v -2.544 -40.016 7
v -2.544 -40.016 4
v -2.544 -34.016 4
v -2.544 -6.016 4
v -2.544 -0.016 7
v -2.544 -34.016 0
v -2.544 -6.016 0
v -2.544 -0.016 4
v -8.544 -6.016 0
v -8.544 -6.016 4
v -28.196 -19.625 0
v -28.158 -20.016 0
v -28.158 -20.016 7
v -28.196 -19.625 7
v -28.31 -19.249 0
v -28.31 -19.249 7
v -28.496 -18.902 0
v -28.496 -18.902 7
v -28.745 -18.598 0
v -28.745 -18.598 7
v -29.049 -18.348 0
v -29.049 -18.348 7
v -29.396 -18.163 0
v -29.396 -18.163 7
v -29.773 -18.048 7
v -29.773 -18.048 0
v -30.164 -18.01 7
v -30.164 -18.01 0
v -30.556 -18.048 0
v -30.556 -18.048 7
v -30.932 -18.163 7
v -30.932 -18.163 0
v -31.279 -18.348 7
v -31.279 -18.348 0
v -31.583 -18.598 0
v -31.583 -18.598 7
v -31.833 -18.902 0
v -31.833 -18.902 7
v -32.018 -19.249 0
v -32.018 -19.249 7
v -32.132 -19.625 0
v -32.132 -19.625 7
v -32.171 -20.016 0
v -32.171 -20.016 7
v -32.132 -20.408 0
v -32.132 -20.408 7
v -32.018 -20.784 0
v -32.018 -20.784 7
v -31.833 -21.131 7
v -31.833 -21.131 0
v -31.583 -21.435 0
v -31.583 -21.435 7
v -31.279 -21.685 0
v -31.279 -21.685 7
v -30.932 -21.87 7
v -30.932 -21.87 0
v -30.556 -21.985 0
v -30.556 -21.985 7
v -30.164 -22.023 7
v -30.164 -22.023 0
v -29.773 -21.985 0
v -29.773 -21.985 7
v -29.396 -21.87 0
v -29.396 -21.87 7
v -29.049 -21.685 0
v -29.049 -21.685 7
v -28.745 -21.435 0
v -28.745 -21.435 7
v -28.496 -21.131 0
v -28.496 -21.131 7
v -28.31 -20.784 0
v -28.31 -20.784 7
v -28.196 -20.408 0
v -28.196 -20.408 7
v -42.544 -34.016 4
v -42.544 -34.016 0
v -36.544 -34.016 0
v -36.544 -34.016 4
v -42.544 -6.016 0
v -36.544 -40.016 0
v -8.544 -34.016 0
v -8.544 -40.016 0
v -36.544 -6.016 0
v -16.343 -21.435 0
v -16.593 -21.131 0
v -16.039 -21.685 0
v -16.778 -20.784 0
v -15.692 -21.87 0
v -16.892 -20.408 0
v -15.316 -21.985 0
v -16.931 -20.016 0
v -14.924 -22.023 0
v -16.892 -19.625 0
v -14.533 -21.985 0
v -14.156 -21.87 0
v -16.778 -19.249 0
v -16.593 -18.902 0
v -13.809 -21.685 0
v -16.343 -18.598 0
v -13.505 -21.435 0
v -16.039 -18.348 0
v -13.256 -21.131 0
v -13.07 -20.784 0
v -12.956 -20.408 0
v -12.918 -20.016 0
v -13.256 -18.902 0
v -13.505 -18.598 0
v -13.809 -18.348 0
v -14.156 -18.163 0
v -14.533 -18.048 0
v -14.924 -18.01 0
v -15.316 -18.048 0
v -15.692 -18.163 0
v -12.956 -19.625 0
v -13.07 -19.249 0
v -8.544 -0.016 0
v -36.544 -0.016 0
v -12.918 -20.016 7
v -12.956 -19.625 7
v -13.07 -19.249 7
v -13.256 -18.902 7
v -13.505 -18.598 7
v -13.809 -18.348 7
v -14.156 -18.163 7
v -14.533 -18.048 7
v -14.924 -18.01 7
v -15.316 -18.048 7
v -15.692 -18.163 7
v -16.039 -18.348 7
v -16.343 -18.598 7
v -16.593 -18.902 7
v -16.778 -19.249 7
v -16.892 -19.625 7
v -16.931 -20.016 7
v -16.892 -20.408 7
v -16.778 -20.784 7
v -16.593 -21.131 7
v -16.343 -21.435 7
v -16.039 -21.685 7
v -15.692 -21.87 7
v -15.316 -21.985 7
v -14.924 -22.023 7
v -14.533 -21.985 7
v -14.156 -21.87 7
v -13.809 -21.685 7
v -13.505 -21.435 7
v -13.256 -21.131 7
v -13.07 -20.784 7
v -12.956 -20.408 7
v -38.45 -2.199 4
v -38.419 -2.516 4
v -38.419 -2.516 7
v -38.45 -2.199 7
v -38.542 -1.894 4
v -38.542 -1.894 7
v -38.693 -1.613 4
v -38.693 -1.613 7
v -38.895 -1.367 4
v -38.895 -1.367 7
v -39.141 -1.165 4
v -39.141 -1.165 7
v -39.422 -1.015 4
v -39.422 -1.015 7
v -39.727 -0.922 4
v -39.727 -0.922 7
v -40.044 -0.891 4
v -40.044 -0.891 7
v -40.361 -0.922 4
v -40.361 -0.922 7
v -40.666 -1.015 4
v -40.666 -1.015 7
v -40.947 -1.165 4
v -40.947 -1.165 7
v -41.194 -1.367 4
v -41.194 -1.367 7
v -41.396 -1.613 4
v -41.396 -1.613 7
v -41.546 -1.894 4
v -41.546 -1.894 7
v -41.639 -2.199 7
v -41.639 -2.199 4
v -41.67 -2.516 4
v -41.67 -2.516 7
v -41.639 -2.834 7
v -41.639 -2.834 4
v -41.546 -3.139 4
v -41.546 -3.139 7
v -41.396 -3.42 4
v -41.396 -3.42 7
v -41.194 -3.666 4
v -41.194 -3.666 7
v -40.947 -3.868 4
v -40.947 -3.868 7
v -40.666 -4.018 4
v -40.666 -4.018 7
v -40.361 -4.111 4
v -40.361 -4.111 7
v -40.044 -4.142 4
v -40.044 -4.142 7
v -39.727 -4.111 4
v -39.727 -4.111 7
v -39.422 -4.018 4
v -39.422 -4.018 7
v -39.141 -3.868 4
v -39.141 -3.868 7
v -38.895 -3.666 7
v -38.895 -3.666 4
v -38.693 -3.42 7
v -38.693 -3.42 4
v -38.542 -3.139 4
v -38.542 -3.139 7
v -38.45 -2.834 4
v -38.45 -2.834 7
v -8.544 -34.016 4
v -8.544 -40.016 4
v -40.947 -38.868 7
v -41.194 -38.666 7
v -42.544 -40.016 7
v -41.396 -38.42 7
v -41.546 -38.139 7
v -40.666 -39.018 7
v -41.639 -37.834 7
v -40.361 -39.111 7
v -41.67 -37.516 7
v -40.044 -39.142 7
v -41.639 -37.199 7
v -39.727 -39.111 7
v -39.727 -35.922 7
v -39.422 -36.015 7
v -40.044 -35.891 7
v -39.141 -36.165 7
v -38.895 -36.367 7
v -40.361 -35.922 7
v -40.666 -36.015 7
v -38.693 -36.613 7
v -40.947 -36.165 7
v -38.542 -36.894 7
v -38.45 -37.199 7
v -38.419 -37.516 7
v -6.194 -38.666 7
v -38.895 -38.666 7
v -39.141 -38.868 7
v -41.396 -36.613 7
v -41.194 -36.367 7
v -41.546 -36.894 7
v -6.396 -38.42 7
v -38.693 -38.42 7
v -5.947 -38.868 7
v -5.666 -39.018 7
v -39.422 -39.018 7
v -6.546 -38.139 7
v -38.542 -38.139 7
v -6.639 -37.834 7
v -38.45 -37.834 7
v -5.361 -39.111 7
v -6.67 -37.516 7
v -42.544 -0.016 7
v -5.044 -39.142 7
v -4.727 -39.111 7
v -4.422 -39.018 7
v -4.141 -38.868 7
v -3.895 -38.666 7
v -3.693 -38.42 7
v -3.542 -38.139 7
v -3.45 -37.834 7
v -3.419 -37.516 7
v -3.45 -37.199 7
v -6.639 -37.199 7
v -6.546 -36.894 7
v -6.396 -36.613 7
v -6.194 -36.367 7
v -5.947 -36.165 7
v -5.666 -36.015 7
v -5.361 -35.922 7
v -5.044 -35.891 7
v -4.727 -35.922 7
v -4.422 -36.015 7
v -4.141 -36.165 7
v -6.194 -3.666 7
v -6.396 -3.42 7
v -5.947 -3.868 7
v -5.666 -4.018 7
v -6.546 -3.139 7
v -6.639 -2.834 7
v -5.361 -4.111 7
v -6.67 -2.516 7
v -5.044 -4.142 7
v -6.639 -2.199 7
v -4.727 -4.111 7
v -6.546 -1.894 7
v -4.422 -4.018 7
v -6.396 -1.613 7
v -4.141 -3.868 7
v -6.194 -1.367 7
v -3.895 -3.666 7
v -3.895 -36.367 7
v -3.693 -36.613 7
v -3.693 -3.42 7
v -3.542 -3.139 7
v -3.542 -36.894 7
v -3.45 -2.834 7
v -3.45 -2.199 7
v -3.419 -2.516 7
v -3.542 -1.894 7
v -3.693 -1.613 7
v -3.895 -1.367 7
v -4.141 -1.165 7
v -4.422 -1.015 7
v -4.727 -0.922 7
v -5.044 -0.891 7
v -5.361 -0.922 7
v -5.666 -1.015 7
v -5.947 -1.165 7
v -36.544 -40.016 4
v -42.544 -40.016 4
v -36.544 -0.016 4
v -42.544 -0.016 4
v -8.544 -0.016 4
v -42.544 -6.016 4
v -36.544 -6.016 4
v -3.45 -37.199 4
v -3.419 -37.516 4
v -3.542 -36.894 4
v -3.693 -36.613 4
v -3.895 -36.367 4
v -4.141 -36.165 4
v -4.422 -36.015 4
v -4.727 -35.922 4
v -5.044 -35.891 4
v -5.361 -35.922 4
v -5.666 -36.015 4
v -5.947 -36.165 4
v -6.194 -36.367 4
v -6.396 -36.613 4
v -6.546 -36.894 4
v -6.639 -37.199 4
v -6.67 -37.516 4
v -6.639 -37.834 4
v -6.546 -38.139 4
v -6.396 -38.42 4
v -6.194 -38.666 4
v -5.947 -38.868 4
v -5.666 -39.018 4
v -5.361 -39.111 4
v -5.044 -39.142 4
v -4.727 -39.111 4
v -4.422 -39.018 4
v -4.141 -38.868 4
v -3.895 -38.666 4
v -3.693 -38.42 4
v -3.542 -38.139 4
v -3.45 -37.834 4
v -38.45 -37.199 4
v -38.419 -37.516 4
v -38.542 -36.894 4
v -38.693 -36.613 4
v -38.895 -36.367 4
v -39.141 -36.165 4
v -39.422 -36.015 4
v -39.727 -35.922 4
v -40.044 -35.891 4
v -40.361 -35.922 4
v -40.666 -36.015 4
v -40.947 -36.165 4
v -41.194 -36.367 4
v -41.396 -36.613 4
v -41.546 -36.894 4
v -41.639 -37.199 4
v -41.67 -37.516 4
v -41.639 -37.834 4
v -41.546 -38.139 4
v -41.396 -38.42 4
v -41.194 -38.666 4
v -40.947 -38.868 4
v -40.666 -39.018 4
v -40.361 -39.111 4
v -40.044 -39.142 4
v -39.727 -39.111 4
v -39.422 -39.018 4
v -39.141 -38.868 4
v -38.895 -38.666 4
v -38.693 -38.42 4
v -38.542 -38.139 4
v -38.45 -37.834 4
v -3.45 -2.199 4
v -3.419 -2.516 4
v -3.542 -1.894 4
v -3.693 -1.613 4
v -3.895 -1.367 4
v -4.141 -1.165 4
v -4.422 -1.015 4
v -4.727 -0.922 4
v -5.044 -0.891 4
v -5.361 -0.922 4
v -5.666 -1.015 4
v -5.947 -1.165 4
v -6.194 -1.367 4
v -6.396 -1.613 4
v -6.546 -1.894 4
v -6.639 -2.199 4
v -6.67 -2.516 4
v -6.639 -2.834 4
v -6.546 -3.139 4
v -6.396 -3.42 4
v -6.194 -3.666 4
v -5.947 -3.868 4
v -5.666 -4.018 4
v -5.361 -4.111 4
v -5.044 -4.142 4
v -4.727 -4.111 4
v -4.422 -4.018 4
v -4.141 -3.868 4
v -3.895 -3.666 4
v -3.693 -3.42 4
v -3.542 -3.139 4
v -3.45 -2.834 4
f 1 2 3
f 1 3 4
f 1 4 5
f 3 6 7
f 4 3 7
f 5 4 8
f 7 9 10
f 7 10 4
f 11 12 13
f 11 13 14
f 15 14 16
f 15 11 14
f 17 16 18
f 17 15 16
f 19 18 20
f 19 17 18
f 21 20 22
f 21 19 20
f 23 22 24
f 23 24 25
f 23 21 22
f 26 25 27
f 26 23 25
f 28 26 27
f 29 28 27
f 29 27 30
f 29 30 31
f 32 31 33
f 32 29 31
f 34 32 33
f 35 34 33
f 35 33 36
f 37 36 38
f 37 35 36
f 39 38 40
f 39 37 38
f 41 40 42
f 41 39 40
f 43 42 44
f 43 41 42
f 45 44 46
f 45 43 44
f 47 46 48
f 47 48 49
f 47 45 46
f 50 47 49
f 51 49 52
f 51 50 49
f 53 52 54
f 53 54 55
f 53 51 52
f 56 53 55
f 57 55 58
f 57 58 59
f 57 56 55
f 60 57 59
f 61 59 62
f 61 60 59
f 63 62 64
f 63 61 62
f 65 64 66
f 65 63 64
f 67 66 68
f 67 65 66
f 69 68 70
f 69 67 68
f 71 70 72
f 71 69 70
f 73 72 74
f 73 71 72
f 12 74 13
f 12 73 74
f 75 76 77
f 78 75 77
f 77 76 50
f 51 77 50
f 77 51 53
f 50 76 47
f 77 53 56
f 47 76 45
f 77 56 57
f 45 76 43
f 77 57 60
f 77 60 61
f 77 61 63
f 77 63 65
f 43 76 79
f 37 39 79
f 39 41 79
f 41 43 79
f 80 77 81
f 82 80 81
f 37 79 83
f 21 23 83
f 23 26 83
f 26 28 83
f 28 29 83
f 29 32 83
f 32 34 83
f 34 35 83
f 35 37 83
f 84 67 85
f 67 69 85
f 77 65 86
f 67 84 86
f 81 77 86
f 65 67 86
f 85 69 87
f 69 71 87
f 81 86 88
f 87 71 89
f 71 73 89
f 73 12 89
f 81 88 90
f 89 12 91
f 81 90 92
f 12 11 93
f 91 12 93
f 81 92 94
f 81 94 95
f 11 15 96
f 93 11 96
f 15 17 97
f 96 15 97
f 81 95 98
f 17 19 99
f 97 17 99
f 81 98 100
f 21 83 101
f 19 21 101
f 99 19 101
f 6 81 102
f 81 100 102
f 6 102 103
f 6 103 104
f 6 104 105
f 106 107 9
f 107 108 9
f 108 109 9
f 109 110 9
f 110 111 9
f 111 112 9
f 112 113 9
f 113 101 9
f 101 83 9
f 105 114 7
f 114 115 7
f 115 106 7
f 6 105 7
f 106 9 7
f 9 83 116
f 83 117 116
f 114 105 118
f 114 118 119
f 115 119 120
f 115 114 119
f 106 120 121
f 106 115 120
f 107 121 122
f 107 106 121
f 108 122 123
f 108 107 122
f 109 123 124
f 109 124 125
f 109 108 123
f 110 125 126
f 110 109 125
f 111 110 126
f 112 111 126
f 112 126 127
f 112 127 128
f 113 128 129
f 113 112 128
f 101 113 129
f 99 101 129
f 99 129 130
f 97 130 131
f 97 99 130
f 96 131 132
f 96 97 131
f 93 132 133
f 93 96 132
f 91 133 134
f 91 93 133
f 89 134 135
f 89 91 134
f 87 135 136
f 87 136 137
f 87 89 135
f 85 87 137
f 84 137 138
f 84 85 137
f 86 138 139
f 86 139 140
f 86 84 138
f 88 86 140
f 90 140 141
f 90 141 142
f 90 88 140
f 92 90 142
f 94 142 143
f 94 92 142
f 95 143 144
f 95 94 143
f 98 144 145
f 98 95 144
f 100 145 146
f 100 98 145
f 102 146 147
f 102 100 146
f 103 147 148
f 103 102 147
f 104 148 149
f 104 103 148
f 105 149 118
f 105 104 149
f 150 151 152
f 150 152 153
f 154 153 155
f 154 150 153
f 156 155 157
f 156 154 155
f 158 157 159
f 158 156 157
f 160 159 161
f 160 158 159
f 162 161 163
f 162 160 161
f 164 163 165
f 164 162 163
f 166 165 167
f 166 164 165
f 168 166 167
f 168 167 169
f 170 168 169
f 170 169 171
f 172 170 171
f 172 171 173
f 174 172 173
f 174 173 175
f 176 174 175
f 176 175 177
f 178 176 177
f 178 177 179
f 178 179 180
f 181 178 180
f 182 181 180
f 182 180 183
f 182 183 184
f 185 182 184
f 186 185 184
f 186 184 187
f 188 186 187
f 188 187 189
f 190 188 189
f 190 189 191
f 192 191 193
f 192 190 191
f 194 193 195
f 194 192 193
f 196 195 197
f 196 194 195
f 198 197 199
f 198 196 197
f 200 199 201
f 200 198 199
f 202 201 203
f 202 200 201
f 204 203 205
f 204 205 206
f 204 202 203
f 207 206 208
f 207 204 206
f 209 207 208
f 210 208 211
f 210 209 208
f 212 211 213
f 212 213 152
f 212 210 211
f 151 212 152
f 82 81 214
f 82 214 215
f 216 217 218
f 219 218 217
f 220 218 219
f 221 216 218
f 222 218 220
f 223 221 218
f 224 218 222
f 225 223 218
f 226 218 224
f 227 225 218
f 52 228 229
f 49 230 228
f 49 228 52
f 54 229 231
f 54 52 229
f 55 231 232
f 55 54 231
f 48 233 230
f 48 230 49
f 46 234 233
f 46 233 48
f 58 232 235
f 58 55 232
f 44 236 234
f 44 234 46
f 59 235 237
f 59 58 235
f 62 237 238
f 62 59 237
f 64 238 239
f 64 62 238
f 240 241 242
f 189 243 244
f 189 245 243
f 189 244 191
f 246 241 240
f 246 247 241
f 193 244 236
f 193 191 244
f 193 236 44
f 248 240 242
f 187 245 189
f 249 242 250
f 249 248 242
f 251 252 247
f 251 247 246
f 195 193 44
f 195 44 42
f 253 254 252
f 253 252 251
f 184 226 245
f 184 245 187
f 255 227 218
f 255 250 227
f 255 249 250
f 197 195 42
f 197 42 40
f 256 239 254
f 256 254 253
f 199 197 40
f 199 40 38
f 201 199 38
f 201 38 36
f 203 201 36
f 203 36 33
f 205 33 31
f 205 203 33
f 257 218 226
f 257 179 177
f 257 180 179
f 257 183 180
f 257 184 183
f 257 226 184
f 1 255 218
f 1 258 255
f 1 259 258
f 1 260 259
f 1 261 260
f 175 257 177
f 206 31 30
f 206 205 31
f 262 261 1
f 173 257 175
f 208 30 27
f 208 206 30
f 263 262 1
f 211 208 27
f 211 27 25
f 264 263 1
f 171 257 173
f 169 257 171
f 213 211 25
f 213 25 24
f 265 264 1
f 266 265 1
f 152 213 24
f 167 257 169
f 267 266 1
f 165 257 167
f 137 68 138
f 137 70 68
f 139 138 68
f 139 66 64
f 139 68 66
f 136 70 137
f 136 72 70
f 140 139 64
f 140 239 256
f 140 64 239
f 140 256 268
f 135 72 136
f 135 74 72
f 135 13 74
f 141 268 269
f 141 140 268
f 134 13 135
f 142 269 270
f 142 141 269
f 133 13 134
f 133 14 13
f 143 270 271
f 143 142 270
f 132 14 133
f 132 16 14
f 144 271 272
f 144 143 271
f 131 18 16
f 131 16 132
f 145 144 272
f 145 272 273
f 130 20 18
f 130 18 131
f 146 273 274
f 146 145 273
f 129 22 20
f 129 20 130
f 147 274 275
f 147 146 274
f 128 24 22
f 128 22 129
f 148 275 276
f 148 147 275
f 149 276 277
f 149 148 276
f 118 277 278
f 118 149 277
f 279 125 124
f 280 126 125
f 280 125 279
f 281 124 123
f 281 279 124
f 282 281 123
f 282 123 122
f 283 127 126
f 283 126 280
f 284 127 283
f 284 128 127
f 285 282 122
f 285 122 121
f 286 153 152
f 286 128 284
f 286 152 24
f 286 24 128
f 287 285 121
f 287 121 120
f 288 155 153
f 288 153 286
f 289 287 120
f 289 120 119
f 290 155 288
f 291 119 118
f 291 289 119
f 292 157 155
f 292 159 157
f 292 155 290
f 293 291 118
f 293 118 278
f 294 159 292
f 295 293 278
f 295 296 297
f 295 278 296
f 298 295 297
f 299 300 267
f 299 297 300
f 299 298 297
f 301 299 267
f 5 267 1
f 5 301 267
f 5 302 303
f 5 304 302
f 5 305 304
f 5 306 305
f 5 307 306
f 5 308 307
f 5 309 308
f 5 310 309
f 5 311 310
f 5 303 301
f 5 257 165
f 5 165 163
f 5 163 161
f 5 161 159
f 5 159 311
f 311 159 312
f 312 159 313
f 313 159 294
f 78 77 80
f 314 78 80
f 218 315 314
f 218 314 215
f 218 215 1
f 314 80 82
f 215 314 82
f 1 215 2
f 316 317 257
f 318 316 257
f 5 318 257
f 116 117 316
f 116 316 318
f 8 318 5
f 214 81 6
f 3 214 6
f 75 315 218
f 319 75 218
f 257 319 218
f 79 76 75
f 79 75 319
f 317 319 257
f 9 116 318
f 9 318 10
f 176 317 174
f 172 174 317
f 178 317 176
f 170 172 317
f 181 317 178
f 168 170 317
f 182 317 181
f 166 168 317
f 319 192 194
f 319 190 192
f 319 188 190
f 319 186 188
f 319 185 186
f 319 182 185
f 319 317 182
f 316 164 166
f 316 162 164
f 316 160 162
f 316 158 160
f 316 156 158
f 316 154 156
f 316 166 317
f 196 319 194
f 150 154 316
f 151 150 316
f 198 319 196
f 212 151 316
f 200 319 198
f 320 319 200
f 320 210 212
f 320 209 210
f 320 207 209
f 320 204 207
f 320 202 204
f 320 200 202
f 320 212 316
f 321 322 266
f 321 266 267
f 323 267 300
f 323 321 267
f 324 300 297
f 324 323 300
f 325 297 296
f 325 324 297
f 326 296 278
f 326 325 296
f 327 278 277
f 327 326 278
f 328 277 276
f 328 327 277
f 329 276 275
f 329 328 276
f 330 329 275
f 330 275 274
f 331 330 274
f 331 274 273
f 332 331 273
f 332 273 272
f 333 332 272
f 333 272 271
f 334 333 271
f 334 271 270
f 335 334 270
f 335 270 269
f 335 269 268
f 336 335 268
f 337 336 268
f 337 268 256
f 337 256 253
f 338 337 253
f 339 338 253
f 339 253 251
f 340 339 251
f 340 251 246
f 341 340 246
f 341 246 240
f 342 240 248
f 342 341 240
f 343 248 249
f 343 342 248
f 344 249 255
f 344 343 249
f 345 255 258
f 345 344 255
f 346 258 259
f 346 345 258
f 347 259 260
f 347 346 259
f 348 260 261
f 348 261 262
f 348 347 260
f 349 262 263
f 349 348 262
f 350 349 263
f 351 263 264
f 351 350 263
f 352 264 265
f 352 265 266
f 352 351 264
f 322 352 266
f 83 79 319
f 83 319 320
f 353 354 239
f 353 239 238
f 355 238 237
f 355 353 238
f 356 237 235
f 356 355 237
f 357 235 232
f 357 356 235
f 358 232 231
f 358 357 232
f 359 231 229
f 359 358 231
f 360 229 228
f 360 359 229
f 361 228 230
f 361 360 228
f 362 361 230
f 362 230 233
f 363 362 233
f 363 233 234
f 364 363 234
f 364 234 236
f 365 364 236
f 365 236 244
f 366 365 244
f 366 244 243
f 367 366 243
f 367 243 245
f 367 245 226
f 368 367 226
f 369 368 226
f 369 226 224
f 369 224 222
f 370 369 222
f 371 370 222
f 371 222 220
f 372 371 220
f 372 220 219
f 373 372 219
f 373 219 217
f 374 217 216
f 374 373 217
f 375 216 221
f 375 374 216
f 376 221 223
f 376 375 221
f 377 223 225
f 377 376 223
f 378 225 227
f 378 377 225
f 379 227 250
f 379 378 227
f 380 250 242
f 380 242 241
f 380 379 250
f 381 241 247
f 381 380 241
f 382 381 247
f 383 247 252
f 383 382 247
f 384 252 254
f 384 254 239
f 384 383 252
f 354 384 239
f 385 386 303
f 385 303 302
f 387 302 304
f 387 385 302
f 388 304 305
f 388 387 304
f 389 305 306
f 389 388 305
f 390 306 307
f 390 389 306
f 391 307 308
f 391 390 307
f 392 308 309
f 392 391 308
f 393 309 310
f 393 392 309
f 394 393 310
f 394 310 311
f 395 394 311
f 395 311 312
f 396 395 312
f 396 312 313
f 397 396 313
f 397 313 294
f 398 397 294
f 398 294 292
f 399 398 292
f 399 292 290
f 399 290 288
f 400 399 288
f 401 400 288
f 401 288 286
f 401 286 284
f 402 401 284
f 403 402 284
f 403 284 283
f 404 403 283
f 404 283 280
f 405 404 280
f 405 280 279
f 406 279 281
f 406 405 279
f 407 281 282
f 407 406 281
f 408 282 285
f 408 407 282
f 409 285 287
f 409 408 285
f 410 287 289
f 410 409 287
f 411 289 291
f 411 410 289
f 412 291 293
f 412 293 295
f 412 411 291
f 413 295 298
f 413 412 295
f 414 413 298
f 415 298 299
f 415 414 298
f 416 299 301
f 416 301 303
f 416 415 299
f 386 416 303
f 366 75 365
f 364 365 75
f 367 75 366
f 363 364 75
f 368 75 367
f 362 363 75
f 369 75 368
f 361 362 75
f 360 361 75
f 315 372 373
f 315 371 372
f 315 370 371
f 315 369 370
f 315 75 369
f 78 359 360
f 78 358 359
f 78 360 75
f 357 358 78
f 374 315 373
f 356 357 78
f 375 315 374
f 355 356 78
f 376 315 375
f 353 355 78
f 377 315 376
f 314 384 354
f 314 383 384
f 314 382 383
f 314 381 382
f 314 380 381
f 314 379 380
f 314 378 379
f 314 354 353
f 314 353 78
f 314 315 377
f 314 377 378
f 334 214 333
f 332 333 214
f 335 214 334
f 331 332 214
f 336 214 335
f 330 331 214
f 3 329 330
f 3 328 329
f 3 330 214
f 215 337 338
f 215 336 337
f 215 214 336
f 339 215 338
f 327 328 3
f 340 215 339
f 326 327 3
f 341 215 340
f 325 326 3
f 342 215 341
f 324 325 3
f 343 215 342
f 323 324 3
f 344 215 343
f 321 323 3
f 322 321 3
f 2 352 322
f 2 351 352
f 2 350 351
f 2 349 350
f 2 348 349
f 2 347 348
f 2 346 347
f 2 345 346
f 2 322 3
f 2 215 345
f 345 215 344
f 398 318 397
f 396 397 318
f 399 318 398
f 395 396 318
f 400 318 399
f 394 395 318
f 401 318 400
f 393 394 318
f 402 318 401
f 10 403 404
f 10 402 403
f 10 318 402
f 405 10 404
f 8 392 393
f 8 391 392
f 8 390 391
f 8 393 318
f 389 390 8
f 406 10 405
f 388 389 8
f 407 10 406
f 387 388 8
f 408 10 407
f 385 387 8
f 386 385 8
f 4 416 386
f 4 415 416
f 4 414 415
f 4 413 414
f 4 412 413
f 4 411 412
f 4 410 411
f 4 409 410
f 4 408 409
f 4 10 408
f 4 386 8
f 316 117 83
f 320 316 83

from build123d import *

# Parameters (mm, degrees)
F0_W     = 40
F0_H     = 40
F0_R     = 1.6256
F0_R_2   = 2.0066
F1_DEPTH = 7
F2_W     = 6
F2_H     = 6
F2_R     = 1.6256
F3_DEPTH = 4


with BuildPart() as f1:
    # F0 (on Top) → F1 (new body)
    with BuildSketch(Plane.XY):
        with Locations((-22.544218, -20.016475)):
            Rectangle(F0_W, F0_H)
        with Locations((-40.044218, -37.516475)):
            Circle(F0_R, mode=Mode.SUBTRACT)
        with Locations((-5.044218, -37.516475)):
            Circle(F0_R, mode=Mode.SUBTRACT)
        with Locations((-30.164218, -20.016475)):
            Circle(F0_R_2, mode=Mode.SUBTRACT)
        with Locations((-40.044218, -2.516475)):
            Circle(F0_R, mode=Mode.SUBTRACT)
        with Locations((-14.924218, -20.016475)):
            Circle(F0_R_2, mode=Mode.SUBTRACT)
        with Locations((-5.044218, -2.516475)):
            Circle(F0_R, mode=Mode.SUBTRACT)
    extrude(amount=F1_DEPTH)

    # F2 (on face) → F3 (cut)
    with BuildSketch(Plane(origin=(0, 0, 0), x_dir=(1, 0, 0), z_dir=(0, 0, -1))):
        with Locations((-39.544218, 37.016475)):
            Rectangle(F2_W, F2_H)
        with Locations((-40.044218, 37.516475)):
            Circle(F2_R, mode=Mode.SUBTRACT)
        with Locations((-5.544218, 37.016475)):
            Rectangle(F2_W, F2_H)
        with Locations((-5.044218, 37.516475)):
            Circle(F2_R, mode=Mode.SUBTRACT)
        with Locations((-5.544218, 3.016475)):
            Rectangle(F2_W, F2_H)
        with Locations((-5.044218, 2.516475)):
            Circle(F2_R, mode=Mode.SUBTRACT)
        with Locations((-39.544218, 3.016475)):
            Rectangle(F2_W, F2_H)
        with Locations((-40.044218, 2.516475)):
            Circle(F2_R, mode=Mode.SUBTRACT)
    extrude(amount=-F3_DEPTH, mode=Mode.SUBTRACT)


solid = f1.part
